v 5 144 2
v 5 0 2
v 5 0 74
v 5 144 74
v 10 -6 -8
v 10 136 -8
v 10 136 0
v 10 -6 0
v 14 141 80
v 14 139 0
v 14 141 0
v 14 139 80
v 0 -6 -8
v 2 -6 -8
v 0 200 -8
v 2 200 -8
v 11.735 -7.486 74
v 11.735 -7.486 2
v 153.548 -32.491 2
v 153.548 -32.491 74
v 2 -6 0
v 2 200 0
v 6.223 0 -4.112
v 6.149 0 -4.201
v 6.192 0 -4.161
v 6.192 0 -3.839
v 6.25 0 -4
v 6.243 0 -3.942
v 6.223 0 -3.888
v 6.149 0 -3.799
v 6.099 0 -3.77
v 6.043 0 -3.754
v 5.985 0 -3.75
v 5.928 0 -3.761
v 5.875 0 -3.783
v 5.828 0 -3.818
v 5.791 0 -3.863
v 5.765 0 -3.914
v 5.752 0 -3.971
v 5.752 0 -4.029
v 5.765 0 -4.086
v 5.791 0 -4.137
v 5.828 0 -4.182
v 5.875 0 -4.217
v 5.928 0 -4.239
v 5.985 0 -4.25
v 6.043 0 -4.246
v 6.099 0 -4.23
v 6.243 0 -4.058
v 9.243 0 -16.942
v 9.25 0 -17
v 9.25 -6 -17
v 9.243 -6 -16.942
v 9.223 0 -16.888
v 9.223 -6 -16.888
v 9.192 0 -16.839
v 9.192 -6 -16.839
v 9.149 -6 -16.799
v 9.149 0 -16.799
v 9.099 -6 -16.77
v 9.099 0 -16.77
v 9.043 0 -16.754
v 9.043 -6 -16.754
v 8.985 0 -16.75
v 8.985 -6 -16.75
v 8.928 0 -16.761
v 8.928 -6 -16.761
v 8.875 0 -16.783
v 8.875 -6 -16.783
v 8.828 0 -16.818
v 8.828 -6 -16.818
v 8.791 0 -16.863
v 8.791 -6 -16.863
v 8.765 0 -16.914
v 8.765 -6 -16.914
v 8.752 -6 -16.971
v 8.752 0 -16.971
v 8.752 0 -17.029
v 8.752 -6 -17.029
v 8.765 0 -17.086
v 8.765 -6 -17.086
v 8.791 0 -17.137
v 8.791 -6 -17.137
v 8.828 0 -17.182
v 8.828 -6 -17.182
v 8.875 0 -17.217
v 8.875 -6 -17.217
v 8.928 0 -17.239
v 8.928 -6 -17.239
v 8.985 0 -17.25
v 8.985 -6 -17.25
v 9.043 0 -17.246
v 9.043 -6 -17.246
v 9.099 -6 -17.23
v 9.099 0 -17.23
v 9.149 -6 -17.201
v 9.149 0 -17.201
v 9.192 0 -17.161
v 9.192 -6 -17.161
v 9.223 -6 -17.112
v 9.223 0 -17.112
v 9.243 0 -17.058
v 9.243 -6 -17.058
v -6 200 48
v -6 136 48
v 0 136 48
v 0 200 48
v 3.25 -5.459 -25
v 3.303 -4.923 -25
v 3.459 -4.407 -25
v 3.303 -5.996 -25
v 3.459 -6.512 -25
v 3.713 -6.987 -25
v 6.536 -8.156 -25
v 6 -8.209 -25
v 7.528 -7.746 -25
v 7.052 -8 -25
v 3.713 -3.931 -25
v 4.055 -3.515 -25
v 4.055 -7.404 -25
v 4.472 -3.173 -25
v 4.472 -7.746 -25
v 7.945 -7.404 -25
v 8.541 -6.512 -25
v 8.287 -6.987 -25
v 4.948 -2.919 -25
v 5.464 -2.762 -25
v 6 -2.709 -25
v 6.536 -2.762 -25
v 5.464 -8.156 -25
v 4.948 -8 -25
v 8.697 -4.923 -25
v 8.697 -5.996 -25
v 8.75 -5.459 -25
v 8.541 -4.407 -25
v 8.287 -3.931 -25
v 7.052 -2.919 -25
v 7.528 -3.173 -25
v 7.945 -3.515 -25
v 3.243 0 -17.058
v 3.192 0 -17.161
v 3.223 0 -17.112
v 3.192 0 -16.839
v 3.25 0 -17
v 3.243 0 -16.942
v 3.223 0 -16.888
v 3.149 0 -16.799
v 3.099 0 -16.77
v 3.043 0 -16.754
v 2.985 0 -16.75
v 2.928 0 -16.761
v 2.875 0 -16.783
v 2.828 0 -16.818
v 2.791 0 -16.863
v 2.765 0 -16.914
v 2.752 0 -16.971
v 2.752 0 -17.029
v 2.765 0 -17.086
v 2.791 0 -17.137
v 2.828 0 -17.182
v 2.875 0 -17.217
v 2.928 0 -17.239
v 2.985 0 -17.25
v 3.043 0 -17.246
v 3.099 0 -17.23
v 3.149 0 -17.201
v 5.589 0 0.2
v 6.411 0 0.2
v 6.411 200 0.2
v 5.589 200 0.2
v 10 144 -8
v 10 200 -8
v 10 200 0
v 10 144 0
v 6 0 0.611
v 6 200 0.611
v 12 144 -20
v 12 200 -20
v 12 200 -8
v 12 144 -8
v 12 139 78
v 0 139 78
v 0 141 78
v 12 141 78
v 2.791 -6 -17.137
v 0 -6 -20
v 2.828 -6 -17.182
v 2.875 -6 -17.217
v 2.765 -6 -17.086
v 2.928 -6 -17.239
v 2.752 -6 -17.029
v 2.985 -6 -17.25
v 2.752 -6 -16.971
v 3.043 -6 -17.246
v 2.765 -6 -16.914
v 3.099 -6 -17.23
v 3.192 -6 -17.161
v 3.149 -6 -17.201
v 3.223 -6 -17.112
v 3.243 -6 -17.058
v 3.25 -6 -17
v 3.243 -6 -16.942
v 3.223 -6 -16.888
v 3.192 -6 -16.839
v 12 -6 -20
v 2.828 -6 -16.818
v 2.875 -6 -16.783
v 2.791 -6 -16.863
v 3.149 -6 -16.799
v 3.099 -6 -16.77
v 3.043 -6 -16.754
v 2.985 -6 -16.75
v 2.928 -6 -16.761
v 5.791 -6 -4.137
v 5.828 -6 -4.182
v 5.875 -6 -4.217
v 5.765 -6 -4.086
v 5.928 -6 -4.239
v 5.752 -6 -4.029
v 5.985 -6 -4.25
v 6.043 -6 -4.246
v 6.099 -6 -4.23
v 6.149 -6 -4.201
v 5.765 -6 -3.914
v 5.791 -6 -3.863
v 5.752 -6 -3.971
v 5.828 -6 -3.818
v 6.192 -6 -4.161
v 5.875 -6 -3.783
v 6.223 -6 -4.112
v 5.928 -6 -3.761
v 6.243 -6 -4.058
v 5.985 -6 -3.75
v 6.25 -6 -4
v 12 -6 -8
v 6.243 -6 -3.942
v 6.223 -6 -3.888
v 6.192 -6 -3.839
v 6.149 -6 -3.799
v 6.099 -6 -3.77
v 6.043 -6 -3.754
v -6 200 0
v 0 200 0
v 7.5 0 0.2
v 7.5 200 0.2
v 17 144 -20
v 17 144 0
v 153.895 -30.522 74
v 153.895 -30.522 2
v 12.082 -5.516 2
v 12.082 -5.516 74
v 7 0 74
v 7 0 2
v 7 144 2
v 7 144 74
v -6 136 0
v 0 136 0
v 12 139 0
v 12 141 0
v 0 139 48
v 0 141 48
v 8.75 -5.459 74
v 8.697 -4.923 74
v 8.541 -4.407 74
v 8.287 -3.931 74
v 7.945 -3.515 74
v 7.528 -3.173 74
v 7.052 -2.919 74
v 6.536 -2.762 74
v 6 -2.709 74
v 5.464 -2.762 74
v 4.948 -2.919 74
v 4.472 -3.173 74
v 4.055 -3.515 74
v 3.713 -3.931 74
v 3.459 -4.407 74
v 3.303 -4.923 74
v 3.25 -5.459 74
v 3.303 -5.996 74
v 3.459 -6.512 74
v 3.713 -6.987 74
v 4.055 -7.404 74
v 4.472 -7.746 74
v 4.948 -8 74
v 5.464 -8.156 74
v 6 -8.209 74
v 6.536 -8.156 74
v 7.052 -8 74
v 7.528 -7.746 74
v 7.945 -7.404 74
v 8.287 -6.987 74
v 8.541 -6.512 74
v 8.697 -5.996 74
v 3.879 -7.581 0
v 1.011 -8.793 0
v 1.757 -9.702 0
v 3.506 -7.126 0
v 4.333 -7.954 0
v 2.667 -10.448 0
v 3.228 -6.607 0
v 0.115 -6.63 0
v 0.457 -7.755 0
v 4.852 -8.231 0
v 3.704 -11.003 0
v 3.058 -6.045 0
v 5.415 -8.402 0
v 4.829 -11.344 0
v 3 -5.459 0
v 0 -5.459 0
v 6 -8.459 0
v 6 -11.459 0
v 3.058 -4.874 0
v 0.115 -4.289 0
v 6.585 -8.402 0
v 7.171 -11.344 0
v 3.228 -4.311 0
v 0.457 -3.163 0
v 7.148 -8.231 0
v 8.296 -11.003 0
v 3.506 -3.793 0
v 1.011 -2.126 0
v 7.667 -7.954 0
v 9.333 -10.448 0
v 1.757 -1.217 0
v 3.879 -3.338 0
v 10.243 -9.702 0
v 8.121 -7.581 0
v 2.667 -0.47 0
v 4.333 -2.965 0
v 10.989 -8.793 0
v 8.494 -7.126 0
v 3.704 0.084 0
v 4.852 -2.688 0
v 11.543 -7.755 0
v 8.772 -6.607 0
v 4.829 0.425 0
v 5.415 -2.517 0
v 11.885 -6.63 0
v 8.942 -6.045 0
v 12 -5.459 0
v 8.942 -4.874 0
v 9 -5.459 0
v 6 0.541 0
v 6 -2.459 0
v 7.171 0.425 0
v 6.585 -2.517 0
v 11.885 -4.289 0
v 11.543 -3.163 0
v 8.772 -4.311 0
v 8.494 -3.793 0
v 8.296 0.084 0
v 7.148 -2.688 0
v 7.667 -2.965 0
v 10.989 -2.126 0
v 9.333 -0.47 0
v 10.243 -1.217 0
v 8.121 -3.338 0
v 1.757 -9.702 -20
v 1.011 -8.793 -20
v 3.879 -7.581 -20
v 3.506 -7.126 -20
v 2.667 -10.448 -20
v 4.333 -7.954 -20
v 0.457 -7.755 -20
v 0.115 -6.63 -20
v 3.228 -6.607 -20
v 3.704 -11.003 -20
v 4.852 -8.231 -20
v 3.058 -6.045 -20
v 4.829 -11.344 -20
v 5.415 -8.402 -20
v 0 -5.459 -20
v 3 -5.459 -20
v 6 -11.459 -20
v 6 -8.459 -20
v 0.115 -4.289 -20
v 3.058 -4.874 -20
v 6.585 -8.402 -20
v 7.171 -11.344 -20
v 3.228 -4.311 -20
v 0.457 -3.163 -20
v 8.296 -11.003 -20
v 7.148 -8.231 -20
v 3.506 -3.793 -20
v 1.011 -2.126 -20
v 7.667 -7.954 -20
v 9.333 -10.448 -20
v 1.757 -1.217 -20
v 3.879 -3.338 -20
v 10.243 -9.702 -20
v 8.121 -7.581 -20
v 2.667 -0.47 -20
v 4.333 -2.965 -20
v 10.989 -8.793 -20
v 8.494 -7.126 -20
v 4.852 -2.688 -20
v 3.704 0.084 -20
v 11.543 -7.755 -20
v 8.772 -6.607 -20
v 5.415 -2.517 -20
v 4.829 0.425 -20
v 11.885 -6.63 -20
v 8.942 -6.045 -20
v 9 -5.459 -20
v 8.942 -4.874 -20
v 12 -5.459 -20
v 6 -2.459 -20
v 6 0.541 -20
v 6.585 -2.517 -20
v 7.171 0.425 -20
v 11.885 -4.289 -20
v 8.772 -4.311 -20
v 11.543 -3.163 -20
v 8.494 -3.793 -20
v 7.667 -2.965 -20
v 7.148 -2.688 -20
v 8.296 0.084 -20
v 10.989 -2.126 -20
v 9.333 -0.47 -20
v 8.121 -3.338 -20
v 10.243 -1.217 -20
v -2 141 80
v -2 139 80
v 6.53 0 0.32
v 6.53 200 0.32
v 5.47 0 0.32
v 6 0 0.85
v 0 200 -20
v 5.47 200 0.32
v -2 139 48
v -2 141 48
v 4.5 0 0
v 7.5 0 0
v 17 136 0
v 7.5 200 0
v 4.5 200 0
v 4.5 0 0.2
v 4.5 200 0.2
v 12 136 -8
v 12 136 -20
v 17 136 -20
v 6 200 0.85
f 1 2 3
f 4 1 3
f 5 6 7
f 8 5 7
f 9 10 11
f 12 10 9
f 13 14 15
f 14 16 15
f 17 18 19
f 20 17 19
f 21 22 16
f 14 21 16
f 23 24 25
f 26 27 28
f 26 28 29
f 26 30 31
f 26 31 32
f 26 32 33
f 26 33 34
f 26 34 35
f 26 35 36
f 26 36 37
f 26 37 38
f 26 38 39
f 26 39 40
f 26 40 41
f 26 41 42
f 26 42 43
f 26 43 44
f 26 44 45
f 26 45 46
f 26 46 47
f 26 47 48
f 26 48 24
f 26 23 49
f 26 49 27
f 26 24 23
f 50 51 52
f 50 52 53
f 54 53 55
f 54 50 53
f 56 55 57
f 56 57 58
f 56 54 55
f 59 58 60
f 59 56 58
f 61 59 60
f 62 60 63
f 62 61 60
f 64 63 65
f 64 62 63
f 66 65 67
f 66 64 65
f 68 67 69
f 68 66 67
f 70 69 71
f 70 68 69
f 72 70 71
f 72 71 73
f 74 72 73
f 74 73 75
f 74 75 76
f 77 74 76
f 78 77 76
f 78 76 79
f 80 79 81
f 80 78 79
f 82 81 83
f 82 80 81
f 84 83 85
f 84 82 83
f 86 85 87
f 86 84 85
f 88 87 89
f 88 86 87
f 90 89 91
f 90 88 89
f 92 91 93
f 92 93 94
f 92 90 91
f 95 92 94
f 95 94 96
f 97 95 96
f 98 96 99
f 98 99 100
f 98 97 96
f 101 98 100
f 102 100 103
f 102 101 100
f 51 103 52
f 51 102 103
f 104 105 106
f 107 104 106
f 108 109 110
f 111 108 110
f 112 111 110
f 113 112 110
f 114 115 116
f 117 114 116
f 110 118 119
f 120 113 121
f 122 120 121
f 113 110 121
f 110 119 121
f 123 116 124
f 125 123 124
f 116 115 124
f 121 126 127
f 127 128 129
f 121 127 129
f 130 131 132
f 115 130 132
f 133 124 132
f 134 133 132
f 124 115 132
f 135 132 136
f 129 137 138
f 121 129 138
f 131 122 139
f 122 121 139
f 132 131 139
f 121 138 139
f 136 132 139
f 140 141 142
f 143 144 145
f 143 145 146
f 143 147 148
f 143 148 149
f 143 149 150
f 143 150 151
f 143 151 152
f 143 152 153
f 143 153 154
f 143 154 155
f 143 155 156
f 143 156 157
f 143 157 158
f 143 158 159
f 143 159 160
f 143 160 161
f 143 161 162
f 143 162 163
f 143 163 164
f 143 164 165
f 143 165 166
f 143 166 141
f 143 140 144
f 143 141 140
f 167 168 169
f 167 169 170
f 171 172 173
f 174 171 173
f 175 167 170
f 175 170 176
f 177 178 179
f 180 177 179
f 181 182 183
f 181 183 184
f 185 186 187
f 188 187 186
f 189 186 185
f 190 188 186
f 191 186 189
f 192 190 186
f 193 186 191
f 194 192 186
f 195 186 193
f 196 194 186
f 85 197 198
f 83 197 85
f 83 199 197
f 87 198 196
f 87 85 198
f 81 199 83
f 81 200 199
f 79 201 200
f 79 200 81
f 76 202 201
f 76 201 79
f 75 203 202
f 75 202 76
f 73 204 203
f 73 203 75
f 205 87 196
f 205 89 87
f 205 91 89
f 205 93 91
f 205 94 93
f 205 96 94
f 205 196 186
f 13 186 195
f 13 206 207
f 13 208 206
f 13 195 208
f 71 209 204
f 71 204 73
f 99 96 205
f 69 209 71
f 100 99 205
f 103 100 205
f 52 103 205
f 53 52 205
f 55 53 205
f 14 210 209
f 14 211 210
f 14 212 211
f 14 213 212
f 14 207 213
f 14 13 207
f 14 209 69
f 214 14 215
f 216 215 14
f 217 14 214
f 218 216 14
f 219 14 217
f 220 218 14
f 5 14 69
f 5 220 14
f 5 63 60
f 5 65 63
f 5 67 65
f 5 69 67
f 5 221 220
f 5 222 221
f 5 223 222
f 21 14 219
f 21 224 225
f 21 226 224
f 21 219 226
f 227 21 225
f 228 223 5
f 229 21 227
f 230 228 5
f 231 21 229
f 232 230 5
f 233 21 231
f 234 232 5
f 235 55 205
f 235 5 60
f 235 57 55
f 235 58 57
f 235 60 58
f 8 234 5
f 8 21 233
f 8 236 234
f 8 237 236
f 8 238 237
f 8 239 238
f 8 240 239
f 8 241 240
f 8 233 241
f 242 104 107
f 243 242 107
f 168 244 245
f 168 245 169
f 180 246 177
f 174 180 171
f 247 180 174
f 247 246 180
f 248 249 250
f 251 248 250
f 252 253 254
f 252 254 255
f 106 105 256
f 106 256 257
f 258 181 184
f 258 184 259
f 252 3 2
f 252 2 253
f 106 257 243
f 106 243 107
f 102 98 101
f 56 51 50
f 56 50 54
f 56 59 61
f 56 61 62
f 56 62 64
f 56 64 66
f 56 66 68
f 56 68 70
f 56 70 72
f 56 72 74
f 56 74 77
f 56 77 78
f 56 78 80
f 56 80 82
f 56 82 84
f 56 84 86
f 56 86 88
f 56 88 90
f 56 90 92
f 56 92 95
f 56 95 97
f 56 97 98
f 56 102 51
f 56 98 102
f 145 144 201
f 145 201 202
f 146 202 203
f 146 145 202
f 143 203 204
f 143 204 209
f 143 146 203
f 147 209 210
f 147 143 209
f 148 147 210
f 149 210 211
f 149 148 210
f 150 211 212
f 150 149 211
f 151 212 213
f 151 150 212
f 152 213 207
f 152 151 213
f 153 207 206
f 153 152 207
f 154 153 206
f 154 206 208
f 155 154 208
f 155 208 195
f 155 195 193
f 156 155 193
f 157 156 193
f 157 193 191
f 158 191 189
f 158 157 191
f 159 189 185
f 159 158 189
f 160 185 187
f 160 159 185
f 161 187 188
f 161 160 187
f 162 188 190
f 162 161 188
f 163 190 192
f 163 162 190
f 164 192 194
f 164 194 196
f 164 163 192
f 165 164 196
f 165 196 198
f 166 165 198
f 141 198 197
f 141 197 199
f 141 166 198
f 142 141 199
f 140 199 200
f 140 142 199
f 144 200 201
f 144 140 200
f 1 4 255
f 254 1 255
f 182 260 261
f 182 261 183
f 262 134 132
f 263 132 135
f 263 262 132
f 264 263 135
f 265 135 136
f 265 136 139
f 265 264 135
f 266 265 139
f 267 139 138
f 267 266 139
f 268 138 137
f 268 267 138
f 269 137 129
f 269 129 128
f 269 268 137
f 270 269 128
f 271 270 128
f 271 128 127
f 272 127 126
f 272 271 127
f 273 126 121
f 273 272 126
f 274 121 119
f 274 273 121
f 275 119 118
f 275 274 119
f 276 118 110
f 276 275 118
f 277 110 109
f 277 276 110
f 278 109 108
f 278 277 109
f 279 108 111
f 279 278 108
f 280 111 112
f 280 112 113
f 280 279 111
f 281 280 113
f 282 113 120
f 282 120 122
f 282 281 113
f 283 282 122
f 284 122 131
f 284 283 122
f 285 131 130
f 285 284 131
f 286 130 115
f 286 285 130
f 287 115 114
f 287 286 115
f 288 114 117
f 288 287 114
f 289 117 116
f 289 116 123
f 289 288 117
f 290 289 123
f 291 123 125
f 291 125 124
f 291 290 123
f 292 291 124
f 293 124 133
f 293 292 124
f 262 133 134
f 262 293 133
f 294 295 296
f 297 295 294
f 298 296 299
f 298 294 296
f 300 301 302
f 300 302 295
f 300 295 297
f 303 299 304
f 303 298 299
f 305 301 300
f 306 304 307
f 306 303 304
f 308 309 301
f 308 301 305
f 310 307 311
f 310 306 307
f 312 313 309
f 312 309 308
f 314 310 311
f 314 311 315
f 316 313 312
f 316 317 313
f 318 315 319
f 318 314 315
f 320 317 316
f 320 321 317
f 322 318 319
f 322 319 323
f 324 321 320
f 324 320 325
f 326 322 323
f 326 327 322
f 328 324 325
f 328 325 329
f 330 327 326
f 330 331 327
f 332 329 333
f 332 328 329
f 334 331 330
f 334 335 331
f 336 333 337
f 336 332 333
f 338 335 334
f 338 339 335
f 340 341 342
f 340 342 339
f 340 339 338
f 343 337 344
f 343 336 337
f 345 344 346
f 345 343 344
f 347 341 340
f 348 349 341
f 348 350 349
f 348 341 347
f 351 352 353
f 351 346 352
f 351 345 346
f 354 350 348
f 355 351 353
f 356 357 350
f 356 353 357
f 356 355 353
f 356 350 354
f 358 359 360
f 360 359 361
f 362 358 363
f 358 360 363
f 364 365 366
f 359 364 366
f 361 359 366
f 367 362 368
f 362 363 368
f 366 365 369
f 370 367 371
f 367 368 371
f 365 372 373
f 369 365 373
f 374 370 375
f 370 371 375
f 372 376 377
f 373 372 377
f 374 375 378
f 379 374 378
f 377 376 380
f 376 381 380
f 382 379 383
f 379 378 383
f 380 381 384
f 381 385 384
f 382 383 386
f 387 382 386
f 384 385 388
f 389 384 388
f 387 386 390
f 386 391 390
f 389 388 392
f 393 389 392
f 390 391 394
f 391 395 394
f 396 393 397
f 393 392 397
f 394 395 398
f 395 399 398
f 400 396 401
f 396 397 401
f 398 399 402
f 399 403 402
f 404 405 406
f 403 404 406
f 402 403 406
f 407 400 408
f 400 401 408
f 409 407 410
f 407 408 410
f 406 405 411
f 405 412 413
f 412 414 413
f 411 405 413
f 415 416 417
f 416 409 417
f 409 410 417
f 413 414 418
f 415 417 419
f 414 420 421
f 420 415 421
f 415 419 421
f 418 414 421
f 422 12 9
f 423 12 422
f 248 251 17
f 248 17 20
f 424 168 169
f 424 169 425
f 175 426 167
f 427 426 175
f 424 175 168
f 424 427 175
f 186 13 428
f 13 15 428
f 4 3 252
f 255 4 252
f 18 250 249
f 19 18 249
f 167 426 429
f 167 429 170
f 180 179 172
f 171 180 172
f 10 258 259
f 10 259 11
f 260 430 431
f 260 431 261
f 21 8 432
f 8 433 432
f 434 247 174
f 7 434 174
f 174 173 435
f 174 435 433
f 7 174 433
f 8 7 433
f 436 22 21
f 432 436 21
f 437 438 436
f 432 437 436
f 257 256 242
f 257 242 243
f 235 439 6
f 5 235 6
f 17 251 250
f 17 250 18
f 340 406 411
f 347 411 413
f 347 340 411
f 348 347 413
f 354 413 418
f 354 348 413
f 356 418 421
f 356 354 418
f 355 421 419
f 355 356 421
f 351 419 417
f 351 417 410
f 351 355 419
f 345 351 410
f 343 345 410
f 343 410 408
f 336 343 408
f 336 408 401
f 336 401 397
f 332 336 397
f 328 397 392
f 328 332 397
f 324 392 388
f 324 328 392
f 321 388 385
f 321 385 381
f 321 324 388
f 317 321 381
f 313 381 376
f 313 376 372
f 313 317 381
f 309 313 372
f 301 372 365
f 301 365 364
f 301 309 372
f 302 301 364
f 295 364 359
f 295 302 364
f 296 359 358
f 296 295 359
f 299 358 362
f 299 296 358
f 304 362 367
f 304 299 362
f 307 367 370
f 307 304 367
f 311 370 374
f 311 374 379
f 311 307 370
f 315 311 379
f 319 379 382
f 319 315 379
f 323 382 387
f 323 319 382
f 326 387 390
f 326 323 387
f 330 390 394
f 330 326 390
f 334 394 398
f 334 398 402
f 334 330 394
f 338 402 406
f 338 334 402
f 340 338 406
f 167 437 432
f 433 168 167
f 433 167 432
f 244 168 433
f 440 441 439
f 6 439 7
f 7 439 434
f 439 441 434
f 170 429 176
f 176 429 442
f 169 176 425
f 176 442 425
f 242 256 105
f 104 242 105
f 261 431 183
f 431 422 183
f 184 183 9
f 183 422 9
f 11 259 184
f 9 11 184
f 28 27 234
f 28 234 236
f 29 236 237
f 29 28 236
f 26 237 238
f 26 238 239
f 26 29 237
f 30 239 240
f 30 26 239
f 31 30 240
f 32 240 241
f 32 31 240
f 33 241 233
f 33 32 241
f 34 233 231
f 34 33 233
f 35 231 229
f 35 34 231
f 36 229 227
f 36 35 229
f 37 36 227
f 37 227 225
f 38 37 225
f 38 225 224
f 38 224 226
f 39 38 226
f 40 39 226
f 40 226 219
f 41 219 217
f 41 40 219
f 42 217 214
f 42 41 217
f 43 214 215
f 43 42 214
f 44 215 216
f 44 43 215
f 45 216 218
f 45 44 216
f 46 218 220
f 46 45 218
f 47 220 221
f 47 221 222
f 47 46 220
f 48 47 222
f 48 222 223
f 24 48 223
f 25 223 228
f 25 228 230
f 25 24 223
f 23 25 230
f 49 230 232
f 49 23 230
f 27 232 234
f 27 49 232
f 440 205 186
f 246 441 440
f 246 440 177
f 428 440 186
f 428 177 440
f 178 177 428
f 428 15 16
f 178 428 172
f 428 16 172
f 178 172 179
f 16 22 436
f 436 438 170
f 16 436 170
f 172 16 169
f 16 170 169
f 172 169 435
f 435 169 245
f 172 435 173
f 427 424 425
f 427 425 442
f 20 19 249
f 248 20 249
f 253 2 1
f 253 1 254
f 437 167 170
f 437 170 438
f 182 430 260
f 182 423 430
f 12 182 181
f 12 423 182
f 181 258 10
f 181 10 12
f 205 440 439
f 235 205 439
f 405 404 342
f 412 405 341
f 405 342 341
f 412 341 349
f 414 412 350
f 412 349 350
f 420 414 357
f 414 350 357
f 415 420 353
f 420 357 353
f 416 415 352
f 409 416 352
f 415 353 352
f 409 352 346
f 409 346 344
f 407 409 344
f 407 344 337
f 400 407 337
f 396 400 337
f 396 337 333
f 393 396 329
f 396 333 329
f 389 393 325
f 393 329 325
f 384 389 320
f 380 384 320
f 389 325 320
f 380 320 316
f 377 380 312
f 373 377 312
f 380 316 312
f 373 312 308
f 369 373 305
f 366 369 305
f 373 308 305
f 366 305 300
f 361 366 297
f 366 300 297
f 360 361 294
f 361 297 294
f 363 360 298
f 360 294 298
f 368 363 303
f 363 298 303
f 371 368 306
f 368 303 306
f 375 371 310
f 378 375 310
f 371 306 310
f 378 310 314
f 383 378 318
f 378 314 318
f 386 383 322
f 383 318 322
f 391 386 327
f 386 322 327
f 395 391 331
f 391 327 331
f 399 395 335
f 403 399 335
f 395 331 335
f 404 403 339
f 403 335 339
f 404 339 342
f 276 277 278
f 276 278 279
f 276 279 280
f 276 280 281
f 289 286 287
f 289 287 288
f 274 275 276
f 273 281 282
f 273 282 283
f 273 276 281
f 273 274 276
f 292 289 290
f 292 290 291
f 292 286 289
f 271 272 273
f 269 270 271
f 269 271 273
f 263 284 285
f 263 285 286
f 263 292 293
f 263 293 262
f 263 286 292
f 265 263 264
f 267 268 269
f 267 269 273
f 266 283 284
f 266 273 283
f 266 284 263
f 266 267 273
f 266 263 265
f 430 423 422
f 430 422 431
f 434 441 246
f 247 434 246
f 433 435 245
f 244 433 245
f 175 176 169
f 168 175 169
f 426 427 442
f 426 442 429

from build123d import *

# Parameters (mm, degrees)
F0_R           = 0.25
F1_DEPTH       = 200
F1_DEPTH_BACK  = 6
F2_DEPTH       = 200
F3_W           = 8
F3_H           = 20
F4_DEPTH       = 5
F5_R           = 6
F5_R_2         = 3
F6_DEPTH       = 20
F7_W           = 6
F7_H           = 48
F8_DEPTH       = 64
F10_START      = -3
F10_DEPTH      = 2
F11_W          = 2
F11_H          = 72
F12_DEPTH      = 144
F14_START      = 2
F14_DEPTH      = 72
F15_R          = 2.75
F16_DEPTH      = 74
F16_DEPTH_BACK = 25


with BuildPart() as f1:
    # F0 (on Front) → F1 (new body, two sides)
    with BuildSketch(Plane.XZ) as f1_sk:
        Polygon((4.5, 0), (2, 0), (2, -8), (10, -8), (10, 0), (7.5, 0), align=None)
        with Locations((6, -4)):
            Circle(F0_R, mode=Mode.SUBTRACT)
        Polygon((10, -8), (2, -8), (0, -8), (0, -20), (12, -20), (12, -8), align=None)
        with Locations((3, -17)):
            Circle(F0_R, mode=Mode.SUBTRACT)
        with Locations((9, -17)):
            Circle(F0_R, mode=Mode.SUBTRACT)
    extrude(amount=-F1_DEPTH)
    extrude(f1_sk.sketch, amount=F1_DEPTH_BACK)

    # F0 (on Front) → F2 (join)
    with BuildSketch(Plane.XZ):
        with Locations((3, -17)):
            Circle(F0_R)
        with Locations((9, -17)):
            Circle(F0_R)
        with Locations((6, -4)):
            Circle(F0_R)
        Polygon((4.5, 0.2), (4.5, 0), (7.5, 0), (7.5, 0.2), (6.4108157787, 0.2), (5.5891842213, 0.2), align=None)
    extrude(amount=-F2_DEPTH)

    # F0 (on Front) → F2, piece 2 (join)
    with BuildSketch(Plane.XZ):
        Polygon((5.4696699141, 0.3195143072), (5.5891842213, 0.2), (6, 0.6108157787), (6.4108157787, 0.2), (6.5303300859, 0.3195143072), (6, 0.8498443931), align=None)
    extrude(amount=-F2_DEPTH)

    # F3 (on face) → F4 (join, symmetric)
    with BuildSketch(Plane.YZ.offset(12)):
        with Locations((140, -10)):
            Rectangle(F3_W, F3_H)
    extrude(amount=F4_DEPTH, both=True)


with BuildPart() as f6:
    # F5 (on Top) → F6 (new body)
    with BuildSketch(Plane.XY):
        with Locations((6, -5.4592969827)):
            Circle(F5_R)
        with Locations((6, -5.4592969827)):
            Circle(F5_R_2, mode=Mode.SUBTRACT)
    extrude(amount=-F6_DEPTH)


with BuildPart() as f8:
    # F7 (on face) → F8 (new body)
    with BuildSketch(Plane.XZ.offset(-136)):
        with Locations((-3, 24)):
            Rectangle(F7_W, F7_H)
    extrude(amount=-F8_DEPTH)


with BuildPart() as f10:
    # F9 (on face) → F10 (new body)
    with BuildSketch(Plane.XZ.offset(-136).offset(F10_START)):
        Polygon((-2, 48), (0, 48), (0, 78), (12, 78), (12, 0), (14, 0), (14, 80), (-2, 80), align=None)
    extrude(amount=-F10_DEPTH)


with BuildPart() as f12:
    # F11 (on Front) → F12 (new body)
    with BuildSketch(Plane.XZ):
        with Locations((6, 38)):
            Rectangle(F11_W, F11_H)
    extrude(amount=-F12_DEPTH)


with BuildPart() as f14:
    # F13 (on Top) → F14 (new body)
    with BuildSketch(Plane.XY.offset(F14_START)):
        Polygon((153.8948111295, -30.5217158798), (12.0824946957, -5.5163782957), (11.7351983404, -7.4859938017), (153.5475147742, -32.4913313858), align=None)
    extrude(amount=F14_DEPTH)


with BuildPart() as f16:
    # F15 (on Top) → F16 (new body, two sides)
    with BuildSketch(Plane.XY) as f16_sk:
        with Locations((6, -5.4592969827)):
            Circle(F15_R)
    extrude(amount=F16_DEPTH)
    extrude(f16_sk.sketch, amount=-F16_DEPTH_BACK)


solid = Compound([f1.part, f6.part, f8.part, f10.part, f12.part, f14.part, f16.part])
